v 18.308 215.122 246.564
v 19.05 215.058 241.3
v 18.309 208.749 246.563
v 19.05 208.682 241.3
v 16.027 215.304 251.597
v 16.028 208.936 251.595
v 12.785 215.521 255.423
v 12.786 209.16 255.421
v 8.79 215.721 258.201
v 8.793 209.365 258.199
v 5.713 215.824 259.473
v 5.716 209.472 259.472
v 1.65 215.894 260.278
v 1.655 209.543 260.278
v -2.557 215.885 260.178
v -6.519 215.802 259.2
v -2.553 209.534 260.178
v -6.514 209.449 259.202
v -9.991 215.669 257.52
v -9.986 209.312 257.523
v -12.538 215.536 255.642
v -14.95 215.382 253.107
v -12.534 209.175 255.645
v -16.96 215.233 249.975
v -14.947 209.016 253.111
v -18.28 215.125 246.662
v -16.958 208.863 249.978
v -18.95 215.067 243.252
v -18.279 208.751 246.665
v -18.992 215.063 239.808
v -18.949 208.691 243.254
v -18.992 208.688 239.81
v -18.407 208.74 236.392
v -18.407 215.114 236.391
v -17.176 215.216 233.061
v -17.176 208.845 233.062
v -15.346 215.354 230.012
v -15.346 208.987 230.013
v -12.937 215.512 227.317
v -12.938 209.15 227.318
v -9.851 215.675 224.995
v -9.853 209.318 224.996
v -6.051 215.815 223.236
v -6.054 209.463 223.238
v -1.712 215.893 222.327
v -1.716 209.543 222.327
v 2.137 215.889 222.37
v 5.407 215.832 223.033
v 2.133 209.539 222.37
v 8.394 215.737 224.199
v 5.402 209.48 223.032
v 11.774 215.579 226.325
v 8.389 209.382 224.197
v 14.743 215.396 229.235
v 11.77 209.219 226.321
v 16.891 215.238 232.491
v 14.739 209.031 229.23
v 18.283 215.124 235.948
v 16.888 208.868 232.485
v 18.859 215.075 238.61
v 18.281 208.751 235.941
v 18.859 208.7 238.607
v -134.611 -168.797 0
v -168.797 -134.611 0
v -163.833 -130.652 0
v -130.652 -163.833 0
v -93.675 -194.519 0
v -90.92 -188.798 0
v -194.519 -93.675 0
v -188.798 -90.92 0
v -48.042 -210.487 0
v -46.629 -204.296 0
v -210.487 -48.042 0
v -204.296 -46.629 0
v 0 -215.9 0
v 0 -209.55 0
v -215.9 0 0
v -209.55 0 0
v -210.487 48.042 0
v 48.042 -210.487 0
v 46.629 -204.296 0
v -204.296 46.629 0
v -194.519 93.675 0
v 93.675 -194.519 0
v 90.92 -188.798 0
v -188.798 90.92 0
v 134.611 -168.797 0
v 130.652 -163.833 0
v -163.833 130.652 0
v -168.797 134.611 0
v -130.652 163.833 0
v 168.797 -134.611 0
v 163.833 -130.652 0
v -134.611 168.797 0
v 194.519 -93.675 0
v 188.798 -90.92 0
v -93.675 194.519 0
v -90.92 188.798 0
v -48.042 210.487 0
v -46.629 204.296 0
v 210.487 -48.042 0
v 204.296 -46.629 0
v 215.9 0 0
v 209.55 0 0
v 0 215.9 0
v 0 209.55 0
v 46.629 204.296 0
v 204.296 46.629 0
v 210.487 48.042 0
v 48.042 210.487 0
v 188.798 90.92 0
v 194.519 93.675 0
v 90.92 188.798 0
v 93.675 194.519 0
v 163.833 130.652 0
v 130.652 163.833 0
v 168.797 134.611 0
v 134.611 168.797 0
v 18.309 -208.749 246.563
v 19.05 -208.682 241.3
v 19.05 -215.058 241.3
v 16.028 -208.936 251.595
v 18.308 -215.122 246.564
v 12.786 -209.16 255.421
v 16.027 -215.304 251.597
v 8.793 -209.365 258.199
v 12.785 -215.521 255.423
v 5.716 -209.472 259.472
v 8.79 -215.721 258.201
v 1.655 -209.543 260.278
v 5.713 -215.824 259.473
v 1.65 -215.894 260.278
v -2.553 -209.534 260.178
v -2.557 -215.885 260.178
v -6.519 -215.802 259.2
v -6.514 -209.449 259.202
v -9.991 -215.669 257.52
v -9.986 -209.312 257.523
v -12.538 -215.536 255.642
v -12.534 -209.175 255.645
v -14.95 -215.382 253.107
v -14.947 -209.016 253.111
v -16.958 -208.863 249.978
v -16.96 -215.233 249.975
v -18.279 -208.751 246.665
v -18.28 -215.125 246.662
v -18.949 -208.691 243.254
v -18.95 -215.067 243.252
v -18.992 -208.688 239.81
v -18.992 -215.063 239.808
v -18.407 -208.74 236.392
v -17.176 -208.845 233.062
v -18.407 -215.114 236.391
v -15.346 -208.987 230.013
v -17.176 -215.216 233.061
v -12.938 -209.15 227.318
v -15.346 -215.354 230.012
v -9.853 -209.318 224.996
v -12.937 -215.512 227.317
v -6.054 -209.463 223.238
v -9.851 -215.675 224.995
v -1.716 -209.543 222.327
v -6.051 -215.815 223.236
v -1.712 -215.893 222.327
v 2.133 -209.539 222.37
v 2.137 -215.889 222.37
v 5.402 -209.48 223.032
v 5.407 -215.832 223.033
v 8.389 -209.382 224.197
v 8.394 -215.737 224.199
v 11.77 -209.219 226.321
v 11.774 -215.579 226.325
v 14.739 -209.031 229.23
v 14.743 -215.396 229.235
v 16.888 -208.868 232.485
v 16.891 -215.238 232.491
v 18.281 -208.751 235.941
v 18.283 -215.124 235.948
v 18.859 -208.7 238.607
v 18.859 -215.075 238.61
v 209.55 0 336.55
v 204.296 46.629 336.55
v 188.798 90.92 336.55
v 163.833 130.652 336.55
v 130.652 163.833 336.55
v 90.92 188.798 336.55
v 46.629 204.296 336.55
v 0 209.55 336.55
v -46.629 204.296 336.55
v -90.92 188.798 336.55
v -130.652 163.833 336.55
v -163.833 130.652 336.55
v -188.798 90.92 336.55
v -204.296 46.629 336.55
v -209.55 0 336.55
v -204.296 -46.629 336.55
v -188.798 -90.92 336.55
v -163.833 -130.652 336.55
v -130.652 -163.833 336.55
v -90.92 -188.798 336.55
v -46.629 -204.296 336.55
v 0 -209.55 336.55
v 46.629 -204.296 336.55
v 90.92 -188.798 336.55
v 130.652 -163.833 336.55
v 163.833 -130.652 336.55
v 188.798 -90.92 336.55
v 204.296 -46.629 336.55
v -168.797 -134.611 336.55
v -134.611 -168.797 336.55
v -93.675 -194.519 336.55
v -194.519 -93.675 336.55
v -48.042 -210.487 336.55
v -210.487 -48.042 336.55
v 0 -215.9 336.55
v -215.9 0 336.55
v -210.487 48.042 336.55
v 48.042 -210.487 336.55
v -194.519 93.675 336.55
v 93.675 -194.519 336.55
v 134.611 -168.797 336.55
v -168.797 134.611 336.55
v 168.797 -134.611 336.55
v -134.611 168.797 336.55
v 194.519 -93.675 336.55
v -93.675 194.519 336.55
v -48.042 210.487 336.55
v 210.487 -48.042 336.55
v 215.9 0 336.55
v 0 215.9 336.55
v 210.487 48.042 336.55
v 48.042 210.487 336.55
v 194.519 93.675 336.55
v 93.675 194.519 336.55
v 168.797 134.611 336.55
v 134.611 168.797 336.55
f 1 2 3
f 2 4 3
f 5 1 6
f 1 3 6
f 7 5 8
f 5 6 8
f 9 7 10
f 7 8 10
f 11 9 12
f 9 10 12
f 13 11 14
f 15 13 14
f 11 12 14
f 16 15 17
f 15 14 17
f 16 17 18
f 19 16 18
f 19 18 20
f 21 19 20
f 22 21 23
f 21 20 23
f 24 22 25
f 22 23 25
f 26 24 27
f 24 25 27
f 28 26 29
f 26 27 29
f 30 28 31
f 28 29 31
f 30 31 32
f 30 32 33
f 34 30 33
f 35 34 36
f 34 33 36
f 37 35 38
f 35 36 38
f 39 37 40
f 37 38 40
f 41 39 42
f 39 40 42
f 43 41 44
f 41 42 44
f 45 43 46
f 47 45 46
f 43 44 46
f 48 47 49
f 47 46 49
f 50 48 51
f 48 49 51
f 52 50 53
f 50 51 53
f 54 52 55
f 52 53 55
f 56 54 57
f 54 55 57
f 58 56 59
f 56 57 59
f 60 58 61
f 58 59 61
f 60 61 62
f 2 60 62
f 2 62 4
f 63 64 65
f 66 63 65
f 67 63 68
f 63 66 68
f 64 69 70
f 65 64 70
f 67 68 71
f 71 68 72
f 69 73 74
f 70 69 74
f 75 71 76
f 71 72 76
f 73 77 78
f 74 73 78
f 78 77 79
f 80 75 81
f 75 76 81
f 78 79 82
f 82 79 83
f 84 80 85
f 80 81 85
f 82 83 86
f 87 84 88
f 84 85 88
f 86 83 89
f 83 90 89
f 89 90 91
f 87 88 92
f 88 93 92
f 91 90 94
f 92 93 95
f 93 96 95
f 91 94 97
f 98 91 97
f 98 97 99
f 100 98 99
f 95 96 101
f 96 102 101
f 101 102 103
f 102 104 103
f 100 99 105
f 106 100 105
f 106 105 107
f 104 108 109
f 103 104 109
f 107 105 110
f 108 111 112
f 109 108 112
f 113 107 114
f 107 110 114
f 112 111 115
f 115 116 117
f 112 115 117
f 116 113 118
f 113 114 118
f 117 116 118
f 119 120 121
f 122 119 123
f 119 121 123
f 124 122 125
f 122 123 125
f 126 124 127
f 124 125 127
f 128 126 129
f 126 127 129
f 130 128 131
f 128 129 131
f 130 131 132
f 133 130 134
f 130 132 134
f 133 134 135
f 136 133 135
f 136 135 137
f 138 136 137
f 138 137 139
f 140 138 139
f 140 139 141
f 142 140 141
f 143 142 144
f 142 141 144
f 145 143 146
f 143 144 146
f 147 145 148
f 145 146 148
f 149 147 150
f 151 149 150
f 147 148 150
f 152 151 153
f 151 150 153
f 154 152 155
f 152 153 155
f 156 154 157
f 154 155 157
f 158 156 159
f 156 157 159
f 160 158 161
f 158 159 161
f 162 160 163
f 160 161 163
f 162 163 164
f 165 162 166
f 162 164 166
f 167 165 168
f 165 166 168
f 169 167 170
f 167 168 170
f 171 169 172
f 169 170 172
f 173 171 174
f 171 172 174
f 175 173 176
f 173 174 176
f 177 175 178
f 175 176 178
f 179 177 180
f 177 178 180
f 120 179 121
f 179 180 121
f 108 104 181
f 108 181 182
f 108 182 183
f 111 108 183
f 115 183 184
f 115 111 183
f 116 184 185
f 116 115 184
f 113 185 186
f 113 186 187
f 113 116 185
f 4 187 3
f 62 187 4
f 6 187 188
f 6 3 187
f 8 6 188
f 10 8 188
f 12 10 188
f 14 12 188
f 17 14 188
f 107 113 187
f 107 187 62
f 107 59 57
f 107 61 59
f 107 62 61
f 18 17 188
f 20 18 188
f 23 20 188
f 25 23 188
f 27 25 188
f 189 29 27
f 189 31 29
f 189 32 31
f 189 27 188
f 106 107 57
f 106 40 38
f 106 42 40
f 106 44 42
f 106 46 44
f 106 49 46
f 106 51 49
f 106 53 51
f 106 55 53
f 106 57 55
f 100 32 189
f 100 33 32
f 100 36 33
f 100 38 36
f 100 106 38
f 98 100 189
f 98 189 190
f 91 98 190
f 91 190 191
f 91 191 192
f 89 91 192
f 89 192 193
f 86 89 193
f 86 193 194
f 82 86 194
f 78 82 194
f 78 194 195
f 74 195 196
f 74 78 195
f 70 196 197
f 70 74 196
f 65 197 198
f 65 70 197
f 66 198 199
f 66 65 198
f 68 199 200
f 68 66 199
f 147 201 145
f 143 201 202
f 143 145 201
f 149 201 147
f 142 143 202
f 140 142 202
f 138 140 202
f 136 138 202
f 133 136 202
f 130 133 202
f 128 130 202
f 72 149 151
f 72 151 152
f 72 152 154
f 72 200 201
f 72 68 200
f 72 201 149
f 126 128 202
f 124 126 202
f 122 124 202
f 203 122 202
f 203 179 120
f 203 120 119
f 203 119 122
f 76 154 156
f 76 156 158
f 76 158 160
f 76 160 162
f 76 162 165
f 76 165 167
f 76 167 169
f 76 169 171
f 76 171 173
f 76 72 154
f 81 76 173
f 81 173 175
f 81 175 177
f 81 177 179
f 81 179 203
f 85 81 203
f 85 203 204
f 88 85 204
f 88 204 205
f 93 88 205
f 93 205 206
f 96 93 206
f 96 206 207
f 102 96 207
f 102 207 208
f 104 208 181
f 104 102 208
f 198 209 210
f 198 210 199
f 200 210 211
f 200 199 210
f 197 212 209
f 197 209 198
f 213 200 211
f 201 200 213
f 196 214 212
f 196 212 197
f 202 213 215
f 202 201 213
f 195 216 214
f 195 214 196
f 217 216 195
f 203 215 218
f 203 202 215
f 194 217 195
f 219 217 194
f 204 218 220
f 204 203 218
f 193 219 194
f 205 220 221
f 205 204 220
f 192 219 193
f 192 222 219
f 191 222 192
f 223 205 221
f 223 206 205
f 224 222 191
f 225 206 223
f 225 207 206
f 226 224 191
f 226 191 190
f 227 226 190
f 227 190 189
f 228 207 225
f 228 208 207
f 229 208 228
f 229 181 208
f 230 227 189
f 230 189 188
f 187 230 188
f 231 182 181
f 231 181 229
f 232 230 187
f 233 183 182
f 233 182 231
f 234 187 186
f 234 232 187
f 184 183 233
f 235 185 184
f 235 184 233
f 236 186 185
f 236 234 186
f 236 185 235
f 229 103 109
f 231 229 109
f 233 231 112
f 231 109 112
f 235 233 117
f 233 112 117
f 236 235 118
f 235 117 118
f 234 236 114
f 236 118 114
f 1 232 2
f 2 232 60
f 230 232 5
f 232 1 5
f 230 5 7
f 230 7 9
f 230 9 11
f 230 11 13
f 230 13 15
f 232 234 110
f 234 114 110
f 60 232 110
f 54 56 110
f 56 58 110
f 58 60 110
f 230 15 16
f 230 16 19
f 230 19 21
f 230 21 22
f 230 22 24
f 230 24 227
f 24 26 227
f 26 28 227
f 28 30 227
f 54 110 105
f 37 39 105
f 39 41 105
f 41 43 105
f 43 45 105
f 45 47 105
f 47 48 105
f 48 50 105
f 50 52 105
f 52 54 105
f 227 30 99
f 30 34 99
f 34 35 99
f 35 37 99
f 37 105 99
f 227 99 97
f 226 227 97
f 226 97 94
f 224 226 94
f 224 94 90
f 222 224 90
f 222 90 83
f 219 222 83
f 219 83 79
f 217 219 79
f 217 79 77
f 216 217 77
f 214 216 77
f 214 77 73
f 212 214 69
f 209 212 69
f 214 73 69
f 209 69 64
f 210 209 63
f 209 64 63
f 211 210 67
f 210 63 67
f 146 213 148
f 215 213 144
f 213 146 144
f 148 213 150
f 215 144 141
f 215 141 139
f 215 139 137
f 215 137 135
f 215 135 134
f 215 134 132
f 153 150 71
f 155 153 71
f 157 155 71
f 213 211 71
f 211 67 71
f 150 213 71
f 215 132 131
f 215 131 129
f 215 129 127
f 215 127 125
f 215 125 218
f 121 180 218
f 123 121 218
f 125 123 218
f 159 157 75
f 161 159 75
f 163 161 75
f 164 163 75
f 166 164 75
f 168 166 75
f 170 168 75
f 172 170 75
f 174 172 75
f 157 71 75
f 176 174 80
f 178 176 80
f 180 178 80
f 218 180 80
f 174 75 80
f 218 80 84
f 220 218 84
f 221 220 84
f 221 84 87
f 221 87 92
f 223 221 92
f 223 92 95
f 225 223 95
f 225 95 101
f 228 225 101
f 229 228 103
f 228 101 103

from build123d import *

# Parameters (mm, degrees)
F0_R     = 215.9
F1_DEPTH = 336.55
F2_T     = -6.35
F3_R     = 19.05
F4_DEPTH = 254


with BuildPart() as f1:
    # F0 (on Top) → F1 (new body)
    with BuildSketch(Plane.XY):
        Circle(F0_R)
    extrude(amount=F1_DEPTH)

    # F2
    f2_openings = [f1.faces().sort_by_distance(p)[0] for p in [
        (0, 0, 336.55),
        (0, 0, 0),
    ]]
    offset(amount=F2_T, openings=f2_openings)

    # F3 (on Front) → F4 (cut, symmetric)
    with BuildSketch(Plane.XZ):
        with Locations((0, 241.3)):
            Circle(F3_R)
    extrude(amount=F4_DEPTH, both=True, mode=Mode.SUBTRACT)


solid = f1.part
